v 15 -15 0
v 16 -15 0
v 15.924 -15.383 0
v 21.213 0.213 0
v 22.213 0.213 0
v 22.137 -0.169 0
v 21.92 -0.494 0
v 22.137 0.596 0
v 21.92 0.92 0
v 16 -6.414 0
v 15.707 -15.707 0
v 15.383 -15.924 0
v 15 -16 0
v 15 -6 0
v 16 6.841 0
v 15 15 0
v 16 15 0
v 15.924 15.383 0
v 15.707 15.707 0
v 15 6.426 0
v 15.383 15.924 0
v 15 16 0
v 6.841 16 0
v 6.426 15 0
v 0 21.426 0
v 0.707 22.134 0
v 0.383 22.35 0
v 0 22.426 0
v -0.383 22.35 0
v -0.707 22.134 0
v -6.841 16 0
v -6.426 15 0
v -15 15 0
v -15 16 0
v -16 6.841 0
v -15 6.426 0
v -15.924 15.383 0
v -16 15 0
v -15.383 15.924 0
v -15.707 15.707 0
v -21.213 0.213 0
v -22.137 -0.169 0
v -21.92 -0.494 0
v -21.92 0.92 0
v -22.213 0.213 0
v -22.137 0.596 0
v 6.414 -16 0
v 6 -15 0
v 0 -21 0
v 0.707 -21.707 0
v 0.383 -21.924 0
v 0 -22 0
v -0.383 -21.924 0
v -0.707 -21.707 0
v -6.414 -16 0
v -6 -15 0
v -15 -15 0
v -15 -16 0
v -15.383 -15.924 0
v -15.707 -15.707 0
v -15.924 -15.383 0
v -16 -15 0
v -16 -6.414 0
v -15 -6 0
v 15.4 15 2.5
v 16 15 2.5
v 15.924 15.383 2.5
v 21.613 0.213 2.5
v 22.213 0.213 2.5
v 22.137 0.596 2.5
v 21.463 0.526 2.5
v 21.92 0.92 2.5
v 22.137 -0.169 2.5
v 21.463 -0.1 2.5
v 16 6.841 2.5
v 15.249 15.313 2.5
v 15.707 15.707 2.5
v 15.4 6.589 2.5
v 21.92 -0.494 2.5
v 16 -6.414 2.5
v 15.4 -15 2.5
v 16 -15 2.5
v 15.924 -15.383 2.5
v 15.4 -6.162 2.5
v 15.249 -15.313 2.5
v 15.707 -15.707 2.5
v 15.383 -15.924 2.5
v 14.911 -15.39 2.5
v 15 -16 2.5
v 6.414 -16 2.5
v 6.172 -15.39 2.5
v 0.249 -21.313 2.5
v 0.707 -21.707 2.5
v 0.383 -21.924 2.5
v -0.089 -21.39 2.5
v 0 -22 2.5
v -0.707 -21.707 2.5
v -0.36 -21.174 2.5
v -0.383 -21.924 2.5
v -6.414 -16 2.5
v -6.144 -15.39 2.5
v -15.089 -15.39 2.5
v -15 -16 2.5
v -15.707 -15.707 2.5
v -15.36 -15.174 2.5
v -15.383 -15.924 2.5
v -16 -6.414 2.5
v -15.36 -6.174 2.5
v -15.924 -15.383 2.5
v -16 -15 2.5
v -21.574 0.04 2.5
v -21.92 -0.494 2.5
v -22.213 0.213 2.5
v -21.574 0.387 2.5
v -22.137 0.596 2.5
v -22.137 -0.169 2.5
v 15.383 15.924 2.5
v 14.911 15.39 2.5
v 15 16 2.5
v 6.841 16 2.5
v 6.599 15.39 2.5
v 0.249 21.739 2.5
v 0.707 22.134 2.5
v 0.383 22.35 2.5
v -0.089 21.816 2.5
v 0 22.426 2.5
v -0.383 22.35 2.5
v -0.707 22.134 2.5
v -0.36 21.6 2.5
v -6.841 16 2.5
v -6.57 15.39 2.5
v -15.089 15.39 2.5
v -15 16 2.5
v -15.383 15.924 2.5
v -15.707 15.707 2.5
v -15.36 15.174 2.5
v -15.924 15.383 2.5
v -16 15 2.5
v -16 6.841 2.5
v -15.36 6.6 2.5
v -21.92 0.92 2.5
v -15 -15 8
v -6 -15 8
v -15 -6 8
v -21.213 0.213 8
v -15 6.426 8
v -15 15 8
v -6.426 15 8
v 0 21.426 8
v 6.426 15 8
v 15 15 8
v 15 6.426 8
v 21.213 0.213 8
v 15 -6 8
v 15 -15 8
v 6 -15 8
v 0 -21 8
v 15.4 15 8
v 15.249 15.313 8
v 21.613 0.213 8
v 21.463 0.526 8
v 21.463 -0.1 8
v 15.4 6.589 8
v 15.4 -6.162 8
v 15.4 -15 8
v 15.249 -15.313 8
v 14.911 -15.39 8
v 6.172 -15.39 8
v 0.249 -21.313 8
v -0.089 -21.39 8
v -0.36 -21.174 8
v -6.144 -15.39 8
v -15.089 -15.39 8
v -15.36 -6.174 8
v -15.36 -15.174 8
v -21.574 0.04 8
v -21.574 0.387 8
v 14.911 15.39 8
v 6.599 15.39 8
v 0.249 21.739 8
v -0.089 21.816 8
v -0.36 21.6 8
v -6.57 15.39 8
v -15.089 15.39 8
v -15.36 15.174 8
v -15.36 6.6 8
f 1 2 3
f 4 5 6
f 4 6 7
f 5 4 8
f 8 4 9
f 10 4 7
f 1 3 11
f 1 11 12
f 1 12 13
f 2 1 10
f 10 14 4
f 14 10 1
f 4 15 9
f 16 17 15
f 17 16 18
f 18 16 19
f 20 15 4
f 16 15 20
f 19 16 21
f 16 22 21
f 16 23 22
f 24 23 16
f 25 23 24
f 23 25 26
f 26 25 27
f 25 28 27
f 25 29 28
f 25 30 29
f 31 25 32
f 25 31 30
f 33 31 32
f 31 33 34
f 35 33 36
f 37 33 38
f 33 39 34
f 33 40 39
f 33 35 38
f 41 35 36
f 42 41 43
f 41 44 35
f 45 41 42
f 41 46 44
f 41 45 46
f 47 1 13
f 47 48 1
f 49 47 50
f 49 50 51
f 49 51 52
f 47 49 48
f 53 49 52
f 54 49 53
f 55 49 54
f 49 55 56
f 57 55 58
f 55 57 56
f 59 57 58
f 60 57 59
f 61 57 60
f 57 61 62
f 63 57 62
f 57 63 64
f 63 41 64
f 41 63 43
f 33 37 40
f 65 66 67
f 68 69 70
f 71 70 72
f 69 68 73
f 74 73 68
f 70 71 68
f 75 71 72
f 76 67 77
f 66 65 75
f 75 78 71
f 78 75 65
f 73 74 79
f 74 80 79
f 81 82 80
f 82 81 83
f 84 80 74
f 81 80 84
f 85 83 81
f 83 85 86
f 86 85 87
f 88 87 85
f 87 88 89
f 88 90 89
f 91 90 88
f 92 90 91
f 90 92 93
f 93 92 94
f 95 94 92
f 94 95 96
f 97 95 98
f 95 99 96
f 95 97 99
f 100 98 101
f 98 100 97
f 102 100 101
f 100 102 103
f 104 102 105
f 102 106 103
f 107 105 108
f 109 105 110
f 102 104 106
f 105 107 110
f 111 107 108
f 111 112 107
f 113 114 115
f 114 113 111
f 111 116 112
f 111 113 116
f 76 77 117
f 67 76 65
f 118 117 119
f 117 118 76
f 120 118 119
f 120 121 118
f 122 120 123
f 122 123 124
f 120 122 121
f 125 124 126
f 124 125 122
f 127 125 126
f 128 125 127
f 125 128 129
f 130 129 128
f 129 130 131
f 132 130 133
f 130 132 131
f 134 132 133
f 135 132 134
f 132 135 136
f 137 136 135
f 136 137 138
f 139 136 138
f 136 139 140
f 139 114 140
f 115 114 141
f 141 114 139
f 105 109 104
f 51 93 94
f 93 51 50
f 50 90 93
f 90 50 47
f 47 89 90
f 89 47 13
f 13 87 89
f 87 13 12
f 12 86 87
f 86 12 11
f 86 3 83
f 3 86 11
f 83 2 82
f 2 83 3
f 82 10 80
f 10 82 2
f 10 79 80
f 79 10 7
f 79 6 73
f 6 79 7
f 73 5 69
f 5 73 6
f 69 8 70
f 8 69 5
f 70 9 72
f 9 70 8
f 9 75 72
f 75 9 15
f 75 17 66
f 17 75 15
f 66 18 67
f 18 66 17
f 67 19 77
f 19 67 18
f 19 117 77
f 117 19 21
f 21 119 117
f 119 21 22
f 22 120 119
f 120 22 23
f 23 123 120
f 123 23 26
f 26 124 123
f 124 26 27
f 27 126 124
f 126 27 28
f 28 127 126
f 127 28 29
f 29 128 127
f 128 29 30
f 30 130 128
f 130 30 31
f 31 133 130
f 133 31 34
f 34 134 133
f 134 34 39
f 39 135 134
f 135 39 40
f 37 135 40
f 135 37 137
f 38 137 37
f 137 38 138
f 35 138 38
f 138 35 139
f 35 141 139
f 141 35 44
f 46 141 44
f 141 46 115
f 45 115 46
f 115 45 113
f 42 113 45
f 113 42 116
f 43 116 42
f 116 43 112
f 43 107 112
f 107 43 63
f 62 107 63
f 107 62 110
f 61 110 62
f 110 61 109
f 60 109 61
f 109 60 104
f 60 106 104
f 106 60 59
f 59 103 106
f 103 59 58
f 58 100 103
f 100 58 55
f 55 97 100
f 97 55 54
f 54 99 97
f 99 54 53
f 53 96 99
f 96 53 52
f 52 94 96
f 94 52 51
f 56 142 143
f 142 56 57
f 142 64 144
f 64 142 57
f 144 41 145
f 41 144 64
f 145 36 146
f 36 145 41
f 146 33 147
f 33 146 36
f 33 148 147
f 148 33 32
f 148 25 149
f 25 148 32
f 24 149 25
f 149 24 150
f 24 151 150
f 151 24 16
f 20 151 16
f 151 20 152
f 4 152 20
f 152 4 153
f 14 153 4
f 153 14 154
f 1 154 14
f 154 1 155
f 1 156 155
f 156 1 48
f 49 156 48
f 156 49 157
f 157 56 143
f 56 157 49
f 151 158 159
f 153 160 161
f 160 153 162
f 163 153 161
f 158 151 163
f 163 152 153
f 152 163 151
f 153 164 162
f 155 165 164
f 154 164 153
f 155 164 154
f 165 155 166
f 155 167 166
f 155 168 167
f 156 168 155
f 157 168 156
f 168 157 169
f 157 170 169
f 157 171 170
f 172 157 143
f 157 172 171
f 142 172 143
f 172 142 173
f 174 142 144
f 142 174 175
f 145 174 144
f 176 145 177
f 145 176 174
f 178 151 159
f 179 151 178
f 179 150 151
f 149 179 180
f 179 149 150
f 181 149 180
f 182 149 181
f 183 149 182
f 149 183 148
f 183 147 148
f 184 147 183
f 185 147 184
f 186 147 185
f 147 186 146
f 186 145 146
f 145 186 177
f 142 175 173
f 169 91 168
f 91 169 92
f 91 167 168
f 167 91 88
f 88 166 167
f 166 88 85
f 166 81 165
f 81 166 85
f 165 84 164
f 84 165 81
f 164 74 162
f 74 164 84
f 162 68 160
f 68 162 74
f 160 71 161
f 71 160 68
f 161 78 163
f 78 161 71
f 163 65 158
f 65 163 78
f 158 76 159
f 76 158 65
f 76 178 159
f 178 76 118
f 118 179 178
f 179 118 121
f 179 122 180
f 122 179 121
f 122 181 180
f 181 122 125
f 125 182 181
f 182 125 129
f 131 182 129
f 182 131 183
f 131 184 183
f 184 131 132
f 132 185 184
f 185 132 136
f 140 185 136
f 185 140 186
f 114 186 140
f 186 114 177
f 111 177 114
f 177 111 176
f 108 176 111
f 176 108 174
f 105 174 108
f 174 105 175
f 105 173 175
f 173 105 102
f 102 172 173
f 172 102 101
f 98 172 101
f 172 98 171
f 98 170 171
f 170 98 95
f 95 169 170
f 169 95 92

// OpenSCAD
// file: Common.scad
module offset_shell(thickness = 0.1) {
  render() {
      difference() {
          minkowski() {
            children();
            circle(2* thickness, center=true);
          }
        children();
      }
   }
}

module cookie_cutter(handle_thickness=2.5, cutter_tickness=1, total_height=10) {
    union() {
        linear_extrude(height = total_height*(0.25), slices = 60) {
            scale([.2,.2,1]) {
              offset_shell(handle_thickness) {
                children();

              }
            }
        };
        linear_extrude(height = total_height*(0.8), slices = 60)
            translate([0,0,2])
            scale([.2,.2,1]) {
              offset_shell(cutter_tickness) {
                children();
            }
        };
    }
}

module rod_with_clipped_circle(square_d, circle_d, circle_placement) {
    difference() {
        square(square_d, center=true);
        translate(circle_placement) circle(circle_d, center=true);
    }
}

//module cookie_press(handle_thickness=2.5, cutter_tickness=1, total_height=10) {
//    union() {
//        cookie_cutter(handle_thickness, cutter_tickness, total_height);
//        translate([0,0,10]) children();
//    }
//}
//
//
// file: ../ComplexShapes.scad
include <BasicShapes.scad>

module HalfCylinder(r, h, e=1, center=false) {
    translate([0,0, center ? -h/2 : 0])difference(){
        cylinder(h,r,r);
        translate([0,-r,-e])cube([2*r,2*r,h+2*e]);
    }
}

module HalfCircle(r) {
    difference(){
        circle(r);
        translate([-r,-2*r,0]) square(2*r);
    }
}

module Crescent(r, fatten_scale=1, curve_angle=0, rotate=0) {
    r_prime = r / fatten_scale;
    rotate([0,0,rotate]) difference() {
        circle(r_prime*1.1);
        translate([r_prime/4, curve_angle*r_prime/4, 0]) circle(r_prime*fatten_scale);
    }
}


module round_edges(r) {
    minkowski() {
        children();
        circle(r);
    };
}

module CrescentV2(outer_r, inner_r, r_shift, edge_rounding=2) {
    // Different way to construct ... rounded edges ...
   round_edges(edge_rounding) {
        difference() {
            circle(outer_r);
            translate(r_shift) circle(inner_r);
        };
    };
}


//module Arch(x,y,r) {
//    // http://kitwallace.co.uk/Blog/item/2013-01-28T17:59:00Z
//    union() {
//        intersection() {
//           translate([x,y,0]) circle(r);
//           translate([-x,y,0]) circle(r);
//        }
//        translate([0,y/2,0]) square(size=[2 * (r-x), y], center=true);
//    }
//}

module Arch(width, arc_height, strech_height=0) {
    // http://kitwallace.co.uk/Blog/item/2013-01-28T17:59:00Z
    r = arc_height;
    x = (width / 2) - r;
    y = arc_height + strech_height;
    union() {
        intersection() {
           translate([x,y,0]) circle(r);
           translate([-x,y,0]) circle(r);
        }
        translate([0,y/2,0]) square(size=[width, y], center=true);
    }
}
// file: ../BasicShapes.scad
module Star(points, outer, inner_defaulted=0) {
    inner = inner_defaulted == 0 ? 2 * outer  : inner_defaulted;
	// polar to cartesian: radius/angle to x/y
	function x(r, a) = r * cos(a);
	function y(r, a) = r * sin(a);
	
	// angular width of each pie slice of the star
	increment = 360/points;
	
	union() {
		for (p = [0 : points-1]) {
			
			// outer is outer point p
			// inner is inner point following p
			// next is next outer point following p

			assign(	
                x_outer = x(outer, increment * p),
                y_outer = y(outer, increment * p),
                x_inner = x(inner, (increment * p) + (increment/2)),
                y_inner = y(inner, (increment * p) + (increment/2)),
                x_next  = x(outer, increment * (p+1)),
                y_next  = y(outer, increment * (p+1))
            ) {
				polygon(
                    points = [
                        [x_outer, y_outer], 
                        [x_inner, y_inner],
                        [x_next, y_next], 
                        [0, 0]
                    ], 
                    paths  = [[0, 1, 2, 3]]
                );
			}
		}
	}
}

//https://github.com/openscad/MCAD/blob/master/shapes.scad
module Hexagon(size) {
  Star(3, size, size);
}

module Octagon(size) {
  Star(4, size, size);
}
// main file
include <../BasicShapes.scad>
include <../ComplexShapes.scad>
include <Common.scad>


module InnerFold(size=20) {
    translate([-size/2, -size/2])
        union() {
            translate([0, 0])rotate([0,0,0])square(size,size);
            translate([size/2, -size/5])rotate([0,0,45])square(size,size);
        }
}

cookie_cutter() {
    InnerFold(150);
}
